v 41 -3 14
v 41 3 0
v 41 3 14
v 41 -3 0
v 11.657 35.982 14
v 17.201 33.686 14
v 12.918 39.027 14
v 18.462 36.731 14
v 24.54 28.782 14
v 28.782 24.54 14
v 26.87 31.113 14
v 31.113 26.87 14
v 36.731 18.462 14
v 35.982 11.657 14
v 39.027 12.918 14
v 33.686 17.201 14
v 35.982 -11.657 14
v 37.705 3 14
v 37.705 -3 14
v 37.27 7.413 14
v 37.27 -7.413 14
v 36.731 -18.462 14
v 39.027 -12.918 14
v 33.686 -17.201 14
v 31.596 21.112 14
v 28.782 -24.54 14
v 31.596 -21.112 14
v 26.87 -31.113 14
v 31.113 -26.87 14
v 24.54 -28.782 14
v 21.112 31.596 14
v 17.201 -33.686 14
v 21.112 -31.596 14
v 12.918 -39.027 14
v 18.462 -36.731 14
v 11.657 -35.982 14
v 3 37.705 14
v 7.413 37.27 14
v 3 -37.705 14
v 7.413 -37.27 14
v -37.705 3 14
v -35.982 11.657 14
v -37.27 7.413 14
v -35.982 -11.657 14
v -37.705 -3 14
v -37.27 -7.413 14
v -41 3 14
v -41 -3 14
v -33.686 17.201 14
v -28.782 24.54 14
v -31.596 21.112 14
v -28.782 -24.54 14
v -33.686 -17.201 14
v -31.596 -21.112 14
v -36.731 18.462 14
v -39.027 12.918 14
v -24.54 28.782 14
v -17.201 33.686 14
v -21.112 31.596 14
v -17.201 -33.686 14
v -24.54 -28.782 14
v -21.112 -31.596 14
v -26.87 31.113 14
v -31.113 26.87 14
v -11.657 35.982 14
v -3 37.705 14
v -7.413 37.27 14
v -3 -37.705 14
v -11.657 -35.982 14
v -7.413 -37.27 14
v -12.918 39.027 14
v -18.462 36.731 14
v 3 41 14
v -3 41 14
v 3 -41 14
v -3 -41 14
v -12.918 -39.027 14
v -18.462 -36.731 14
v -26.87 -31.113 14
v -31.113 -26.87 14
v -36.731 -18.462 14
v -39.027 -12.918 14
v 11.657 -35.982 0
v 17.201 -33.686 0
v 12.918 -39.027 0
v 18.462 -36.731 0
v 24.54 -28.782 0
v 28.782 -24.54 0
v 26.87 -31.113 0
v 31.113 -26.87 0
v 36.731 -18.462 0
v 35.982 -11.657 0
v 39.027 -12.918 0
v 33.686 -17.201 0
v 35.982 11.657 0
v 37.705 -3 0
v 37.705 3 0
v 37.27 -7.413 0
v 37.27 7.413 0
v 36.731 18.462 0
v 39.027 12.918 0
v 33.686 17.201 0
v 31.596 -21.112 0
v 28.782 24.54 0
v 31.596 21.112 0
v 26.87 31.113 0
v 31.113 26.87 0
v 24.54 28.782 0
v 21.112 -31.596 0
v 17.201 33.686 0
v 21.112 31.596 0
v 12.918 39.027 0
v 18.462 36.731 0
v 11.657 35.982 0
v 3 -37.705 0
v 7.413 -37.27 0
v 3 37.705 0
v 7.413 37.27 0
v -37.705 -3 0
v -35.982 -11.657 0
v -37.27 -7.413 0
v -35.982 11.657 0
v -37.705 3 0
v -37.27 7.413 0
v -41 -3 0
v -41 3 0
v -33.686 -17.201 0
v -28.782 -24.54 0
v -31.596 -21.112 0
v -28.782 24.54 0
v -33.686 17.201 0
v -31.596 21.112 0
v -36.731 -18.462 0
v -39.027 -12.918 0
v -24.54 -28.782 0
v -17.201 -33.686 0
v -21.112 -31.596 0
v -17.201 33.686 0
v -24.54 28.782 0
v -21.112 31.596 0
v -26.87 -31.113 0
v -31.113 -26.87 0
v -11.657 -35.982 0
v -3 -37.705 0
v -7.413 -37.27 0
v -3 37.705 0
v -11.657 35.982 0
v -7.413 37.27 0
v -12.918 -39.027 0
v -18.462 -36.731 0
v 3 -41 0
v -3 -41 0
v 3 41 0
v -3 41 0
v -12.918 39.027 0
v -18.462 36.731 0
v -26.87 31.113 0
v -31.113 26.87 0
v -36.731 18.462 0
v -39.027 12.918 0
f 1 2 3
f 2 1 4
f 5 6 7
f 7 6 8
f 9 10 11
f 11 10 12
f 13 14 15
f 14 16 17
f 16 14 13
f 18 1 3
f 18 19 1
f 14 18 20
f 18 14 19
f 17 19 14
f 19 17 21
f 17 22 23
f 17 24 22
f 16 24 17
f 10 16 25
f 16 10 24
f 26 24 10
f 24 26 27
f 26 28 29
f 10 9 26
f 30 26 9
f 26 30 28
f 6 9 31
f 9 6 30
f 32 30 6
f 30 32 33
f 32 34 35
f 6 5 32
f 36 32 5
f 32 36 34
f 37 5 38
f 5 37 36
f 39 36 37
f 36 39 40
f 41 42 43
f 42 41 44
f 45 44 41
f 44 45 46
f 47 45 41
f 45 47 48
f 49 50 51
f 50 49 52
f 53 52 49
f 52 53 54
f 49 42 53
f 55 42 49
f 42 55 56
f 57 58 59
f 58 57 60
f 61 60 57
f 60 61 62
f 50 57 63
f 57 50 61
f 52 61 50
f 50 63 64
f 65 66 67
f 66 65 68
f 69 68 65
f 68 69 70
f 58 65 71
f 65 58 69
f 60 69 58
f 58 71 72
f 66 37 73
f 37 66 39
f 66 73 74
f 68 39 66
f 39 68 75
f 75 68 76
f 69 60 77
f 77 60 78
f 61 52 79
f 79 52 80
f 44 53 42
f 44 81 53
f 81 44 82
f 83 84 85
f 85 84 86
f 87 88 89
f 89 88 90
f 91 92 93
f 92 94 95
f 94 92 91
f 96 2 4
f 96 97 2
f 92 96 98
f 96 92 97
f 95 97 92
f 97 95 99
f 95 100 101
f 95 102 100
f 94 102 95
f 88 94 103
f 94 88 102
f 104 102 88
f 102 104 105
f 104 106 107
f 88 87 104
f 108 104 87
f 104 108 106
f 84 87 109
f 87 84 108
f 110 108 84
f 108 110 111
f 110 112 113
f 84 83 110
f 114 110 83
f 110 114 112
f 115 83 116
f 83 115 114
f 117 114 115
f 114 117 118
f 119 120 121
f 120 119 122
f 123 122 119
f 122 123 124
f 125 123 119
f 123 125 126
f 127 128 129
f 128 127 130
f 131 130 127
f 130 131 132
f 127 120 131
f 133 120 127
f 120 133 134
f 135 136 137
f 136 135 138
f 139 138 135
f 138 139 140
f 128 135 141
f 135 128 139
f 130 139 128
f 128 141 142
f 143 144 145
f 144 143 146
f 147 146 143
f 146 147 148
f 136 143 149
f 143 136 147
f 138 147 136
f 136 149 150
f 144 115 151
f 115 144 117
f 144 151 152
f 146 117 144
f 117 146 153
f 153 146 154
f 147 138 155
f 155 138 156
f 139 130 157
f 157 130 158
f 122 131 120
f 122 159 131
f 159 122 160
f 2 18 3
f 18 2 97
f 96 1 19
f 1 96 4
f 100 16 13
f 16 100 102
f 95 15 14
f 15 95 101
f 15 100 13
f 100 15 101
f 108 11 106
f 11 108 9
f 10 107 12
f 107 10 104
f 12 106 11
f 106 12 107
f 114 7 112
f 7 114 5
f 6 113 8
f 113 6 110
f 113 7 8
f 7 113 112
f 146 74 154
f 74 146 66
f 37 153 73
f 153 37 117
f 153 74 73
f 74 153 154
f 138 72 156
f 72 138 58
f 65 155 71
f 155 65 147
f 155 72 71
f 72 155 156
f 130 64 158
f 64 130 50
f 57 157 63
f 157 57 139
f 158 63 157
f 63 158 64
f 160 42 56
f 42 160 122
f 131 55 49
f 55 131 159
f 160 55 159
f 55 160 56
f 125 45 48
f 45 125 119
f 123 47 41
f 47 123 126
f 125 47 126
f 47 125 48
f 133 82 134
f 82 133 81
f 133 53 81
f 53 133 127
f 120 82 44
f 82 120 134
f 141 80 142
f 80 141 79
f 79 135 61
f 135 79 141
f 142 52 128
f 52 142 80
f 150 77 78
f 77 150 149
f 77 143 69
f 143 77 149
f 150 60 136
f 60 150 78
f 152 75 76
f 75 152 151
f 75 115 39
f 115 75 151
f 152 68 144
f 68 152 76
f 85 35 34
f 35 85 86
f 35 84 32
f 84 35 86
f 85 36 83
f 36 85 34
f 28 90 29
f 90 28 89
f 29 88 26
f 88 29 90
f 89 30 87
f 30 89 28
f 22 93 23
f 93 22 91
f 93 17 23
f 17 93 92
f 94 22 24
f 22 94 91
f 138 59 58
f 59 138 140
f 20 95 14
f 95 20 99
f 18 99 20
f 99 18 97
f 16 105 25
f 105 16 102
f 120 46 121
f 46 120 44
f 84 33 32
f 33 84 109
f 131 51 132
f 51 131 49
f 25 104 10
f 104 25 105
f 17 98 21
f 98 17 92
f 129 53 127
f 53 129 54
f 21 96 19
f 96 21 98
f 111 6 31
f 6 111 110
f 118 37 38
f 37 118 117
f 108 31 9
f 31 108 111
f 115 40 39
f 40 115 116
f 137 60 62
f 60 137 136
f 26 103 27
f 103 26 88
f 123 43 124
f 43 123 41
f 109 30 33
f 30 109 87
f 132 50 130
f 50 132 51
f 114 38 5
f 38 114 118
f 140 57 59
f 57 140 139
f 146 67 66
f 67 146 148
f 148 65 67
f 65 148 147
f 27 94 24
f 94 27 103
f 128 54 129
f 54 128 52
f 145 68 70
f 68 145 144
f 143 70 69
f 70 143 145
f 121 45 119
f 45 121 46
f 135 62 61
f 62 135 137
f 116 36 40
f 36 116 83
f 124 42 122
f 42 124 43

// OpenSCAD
$fn = 32;

// ----------------------------------------------------------------------
// Spur blank: plain gear blank
// ----------------------------------------------------------------------

// --- parameters (mm) ---
disc_r = 38;              // blank root radius
disc_t = 14;              // blank thickness
n_teeth = 16;             // stub tooth count
tooth_w = 6;              // tooth width at the root
tooth_h = 3;              // tooth height above the root
fit_tol = 0.05;           // tolerance for press fits, mm
free_tol = 0.3;           // tolerance for clearance fits, mm

out_r = disc_r + tooth_h;  // tip radius
bbox_x = 82.0;  // measured width over the teeth
bbox_y = 82.0;  // measured depth over the teeth

union() {
  cylinder(r = disc_r, h = disc_t);
  for (i = [0 : n_teeth - 1])
    rotate([0, 0, i * 360 / n_teeth])
      translate([disc_r - 1, -tooth_w / 2, 0])
        cube([tooth_h + 1, tooth_w, disc_t]);
}
